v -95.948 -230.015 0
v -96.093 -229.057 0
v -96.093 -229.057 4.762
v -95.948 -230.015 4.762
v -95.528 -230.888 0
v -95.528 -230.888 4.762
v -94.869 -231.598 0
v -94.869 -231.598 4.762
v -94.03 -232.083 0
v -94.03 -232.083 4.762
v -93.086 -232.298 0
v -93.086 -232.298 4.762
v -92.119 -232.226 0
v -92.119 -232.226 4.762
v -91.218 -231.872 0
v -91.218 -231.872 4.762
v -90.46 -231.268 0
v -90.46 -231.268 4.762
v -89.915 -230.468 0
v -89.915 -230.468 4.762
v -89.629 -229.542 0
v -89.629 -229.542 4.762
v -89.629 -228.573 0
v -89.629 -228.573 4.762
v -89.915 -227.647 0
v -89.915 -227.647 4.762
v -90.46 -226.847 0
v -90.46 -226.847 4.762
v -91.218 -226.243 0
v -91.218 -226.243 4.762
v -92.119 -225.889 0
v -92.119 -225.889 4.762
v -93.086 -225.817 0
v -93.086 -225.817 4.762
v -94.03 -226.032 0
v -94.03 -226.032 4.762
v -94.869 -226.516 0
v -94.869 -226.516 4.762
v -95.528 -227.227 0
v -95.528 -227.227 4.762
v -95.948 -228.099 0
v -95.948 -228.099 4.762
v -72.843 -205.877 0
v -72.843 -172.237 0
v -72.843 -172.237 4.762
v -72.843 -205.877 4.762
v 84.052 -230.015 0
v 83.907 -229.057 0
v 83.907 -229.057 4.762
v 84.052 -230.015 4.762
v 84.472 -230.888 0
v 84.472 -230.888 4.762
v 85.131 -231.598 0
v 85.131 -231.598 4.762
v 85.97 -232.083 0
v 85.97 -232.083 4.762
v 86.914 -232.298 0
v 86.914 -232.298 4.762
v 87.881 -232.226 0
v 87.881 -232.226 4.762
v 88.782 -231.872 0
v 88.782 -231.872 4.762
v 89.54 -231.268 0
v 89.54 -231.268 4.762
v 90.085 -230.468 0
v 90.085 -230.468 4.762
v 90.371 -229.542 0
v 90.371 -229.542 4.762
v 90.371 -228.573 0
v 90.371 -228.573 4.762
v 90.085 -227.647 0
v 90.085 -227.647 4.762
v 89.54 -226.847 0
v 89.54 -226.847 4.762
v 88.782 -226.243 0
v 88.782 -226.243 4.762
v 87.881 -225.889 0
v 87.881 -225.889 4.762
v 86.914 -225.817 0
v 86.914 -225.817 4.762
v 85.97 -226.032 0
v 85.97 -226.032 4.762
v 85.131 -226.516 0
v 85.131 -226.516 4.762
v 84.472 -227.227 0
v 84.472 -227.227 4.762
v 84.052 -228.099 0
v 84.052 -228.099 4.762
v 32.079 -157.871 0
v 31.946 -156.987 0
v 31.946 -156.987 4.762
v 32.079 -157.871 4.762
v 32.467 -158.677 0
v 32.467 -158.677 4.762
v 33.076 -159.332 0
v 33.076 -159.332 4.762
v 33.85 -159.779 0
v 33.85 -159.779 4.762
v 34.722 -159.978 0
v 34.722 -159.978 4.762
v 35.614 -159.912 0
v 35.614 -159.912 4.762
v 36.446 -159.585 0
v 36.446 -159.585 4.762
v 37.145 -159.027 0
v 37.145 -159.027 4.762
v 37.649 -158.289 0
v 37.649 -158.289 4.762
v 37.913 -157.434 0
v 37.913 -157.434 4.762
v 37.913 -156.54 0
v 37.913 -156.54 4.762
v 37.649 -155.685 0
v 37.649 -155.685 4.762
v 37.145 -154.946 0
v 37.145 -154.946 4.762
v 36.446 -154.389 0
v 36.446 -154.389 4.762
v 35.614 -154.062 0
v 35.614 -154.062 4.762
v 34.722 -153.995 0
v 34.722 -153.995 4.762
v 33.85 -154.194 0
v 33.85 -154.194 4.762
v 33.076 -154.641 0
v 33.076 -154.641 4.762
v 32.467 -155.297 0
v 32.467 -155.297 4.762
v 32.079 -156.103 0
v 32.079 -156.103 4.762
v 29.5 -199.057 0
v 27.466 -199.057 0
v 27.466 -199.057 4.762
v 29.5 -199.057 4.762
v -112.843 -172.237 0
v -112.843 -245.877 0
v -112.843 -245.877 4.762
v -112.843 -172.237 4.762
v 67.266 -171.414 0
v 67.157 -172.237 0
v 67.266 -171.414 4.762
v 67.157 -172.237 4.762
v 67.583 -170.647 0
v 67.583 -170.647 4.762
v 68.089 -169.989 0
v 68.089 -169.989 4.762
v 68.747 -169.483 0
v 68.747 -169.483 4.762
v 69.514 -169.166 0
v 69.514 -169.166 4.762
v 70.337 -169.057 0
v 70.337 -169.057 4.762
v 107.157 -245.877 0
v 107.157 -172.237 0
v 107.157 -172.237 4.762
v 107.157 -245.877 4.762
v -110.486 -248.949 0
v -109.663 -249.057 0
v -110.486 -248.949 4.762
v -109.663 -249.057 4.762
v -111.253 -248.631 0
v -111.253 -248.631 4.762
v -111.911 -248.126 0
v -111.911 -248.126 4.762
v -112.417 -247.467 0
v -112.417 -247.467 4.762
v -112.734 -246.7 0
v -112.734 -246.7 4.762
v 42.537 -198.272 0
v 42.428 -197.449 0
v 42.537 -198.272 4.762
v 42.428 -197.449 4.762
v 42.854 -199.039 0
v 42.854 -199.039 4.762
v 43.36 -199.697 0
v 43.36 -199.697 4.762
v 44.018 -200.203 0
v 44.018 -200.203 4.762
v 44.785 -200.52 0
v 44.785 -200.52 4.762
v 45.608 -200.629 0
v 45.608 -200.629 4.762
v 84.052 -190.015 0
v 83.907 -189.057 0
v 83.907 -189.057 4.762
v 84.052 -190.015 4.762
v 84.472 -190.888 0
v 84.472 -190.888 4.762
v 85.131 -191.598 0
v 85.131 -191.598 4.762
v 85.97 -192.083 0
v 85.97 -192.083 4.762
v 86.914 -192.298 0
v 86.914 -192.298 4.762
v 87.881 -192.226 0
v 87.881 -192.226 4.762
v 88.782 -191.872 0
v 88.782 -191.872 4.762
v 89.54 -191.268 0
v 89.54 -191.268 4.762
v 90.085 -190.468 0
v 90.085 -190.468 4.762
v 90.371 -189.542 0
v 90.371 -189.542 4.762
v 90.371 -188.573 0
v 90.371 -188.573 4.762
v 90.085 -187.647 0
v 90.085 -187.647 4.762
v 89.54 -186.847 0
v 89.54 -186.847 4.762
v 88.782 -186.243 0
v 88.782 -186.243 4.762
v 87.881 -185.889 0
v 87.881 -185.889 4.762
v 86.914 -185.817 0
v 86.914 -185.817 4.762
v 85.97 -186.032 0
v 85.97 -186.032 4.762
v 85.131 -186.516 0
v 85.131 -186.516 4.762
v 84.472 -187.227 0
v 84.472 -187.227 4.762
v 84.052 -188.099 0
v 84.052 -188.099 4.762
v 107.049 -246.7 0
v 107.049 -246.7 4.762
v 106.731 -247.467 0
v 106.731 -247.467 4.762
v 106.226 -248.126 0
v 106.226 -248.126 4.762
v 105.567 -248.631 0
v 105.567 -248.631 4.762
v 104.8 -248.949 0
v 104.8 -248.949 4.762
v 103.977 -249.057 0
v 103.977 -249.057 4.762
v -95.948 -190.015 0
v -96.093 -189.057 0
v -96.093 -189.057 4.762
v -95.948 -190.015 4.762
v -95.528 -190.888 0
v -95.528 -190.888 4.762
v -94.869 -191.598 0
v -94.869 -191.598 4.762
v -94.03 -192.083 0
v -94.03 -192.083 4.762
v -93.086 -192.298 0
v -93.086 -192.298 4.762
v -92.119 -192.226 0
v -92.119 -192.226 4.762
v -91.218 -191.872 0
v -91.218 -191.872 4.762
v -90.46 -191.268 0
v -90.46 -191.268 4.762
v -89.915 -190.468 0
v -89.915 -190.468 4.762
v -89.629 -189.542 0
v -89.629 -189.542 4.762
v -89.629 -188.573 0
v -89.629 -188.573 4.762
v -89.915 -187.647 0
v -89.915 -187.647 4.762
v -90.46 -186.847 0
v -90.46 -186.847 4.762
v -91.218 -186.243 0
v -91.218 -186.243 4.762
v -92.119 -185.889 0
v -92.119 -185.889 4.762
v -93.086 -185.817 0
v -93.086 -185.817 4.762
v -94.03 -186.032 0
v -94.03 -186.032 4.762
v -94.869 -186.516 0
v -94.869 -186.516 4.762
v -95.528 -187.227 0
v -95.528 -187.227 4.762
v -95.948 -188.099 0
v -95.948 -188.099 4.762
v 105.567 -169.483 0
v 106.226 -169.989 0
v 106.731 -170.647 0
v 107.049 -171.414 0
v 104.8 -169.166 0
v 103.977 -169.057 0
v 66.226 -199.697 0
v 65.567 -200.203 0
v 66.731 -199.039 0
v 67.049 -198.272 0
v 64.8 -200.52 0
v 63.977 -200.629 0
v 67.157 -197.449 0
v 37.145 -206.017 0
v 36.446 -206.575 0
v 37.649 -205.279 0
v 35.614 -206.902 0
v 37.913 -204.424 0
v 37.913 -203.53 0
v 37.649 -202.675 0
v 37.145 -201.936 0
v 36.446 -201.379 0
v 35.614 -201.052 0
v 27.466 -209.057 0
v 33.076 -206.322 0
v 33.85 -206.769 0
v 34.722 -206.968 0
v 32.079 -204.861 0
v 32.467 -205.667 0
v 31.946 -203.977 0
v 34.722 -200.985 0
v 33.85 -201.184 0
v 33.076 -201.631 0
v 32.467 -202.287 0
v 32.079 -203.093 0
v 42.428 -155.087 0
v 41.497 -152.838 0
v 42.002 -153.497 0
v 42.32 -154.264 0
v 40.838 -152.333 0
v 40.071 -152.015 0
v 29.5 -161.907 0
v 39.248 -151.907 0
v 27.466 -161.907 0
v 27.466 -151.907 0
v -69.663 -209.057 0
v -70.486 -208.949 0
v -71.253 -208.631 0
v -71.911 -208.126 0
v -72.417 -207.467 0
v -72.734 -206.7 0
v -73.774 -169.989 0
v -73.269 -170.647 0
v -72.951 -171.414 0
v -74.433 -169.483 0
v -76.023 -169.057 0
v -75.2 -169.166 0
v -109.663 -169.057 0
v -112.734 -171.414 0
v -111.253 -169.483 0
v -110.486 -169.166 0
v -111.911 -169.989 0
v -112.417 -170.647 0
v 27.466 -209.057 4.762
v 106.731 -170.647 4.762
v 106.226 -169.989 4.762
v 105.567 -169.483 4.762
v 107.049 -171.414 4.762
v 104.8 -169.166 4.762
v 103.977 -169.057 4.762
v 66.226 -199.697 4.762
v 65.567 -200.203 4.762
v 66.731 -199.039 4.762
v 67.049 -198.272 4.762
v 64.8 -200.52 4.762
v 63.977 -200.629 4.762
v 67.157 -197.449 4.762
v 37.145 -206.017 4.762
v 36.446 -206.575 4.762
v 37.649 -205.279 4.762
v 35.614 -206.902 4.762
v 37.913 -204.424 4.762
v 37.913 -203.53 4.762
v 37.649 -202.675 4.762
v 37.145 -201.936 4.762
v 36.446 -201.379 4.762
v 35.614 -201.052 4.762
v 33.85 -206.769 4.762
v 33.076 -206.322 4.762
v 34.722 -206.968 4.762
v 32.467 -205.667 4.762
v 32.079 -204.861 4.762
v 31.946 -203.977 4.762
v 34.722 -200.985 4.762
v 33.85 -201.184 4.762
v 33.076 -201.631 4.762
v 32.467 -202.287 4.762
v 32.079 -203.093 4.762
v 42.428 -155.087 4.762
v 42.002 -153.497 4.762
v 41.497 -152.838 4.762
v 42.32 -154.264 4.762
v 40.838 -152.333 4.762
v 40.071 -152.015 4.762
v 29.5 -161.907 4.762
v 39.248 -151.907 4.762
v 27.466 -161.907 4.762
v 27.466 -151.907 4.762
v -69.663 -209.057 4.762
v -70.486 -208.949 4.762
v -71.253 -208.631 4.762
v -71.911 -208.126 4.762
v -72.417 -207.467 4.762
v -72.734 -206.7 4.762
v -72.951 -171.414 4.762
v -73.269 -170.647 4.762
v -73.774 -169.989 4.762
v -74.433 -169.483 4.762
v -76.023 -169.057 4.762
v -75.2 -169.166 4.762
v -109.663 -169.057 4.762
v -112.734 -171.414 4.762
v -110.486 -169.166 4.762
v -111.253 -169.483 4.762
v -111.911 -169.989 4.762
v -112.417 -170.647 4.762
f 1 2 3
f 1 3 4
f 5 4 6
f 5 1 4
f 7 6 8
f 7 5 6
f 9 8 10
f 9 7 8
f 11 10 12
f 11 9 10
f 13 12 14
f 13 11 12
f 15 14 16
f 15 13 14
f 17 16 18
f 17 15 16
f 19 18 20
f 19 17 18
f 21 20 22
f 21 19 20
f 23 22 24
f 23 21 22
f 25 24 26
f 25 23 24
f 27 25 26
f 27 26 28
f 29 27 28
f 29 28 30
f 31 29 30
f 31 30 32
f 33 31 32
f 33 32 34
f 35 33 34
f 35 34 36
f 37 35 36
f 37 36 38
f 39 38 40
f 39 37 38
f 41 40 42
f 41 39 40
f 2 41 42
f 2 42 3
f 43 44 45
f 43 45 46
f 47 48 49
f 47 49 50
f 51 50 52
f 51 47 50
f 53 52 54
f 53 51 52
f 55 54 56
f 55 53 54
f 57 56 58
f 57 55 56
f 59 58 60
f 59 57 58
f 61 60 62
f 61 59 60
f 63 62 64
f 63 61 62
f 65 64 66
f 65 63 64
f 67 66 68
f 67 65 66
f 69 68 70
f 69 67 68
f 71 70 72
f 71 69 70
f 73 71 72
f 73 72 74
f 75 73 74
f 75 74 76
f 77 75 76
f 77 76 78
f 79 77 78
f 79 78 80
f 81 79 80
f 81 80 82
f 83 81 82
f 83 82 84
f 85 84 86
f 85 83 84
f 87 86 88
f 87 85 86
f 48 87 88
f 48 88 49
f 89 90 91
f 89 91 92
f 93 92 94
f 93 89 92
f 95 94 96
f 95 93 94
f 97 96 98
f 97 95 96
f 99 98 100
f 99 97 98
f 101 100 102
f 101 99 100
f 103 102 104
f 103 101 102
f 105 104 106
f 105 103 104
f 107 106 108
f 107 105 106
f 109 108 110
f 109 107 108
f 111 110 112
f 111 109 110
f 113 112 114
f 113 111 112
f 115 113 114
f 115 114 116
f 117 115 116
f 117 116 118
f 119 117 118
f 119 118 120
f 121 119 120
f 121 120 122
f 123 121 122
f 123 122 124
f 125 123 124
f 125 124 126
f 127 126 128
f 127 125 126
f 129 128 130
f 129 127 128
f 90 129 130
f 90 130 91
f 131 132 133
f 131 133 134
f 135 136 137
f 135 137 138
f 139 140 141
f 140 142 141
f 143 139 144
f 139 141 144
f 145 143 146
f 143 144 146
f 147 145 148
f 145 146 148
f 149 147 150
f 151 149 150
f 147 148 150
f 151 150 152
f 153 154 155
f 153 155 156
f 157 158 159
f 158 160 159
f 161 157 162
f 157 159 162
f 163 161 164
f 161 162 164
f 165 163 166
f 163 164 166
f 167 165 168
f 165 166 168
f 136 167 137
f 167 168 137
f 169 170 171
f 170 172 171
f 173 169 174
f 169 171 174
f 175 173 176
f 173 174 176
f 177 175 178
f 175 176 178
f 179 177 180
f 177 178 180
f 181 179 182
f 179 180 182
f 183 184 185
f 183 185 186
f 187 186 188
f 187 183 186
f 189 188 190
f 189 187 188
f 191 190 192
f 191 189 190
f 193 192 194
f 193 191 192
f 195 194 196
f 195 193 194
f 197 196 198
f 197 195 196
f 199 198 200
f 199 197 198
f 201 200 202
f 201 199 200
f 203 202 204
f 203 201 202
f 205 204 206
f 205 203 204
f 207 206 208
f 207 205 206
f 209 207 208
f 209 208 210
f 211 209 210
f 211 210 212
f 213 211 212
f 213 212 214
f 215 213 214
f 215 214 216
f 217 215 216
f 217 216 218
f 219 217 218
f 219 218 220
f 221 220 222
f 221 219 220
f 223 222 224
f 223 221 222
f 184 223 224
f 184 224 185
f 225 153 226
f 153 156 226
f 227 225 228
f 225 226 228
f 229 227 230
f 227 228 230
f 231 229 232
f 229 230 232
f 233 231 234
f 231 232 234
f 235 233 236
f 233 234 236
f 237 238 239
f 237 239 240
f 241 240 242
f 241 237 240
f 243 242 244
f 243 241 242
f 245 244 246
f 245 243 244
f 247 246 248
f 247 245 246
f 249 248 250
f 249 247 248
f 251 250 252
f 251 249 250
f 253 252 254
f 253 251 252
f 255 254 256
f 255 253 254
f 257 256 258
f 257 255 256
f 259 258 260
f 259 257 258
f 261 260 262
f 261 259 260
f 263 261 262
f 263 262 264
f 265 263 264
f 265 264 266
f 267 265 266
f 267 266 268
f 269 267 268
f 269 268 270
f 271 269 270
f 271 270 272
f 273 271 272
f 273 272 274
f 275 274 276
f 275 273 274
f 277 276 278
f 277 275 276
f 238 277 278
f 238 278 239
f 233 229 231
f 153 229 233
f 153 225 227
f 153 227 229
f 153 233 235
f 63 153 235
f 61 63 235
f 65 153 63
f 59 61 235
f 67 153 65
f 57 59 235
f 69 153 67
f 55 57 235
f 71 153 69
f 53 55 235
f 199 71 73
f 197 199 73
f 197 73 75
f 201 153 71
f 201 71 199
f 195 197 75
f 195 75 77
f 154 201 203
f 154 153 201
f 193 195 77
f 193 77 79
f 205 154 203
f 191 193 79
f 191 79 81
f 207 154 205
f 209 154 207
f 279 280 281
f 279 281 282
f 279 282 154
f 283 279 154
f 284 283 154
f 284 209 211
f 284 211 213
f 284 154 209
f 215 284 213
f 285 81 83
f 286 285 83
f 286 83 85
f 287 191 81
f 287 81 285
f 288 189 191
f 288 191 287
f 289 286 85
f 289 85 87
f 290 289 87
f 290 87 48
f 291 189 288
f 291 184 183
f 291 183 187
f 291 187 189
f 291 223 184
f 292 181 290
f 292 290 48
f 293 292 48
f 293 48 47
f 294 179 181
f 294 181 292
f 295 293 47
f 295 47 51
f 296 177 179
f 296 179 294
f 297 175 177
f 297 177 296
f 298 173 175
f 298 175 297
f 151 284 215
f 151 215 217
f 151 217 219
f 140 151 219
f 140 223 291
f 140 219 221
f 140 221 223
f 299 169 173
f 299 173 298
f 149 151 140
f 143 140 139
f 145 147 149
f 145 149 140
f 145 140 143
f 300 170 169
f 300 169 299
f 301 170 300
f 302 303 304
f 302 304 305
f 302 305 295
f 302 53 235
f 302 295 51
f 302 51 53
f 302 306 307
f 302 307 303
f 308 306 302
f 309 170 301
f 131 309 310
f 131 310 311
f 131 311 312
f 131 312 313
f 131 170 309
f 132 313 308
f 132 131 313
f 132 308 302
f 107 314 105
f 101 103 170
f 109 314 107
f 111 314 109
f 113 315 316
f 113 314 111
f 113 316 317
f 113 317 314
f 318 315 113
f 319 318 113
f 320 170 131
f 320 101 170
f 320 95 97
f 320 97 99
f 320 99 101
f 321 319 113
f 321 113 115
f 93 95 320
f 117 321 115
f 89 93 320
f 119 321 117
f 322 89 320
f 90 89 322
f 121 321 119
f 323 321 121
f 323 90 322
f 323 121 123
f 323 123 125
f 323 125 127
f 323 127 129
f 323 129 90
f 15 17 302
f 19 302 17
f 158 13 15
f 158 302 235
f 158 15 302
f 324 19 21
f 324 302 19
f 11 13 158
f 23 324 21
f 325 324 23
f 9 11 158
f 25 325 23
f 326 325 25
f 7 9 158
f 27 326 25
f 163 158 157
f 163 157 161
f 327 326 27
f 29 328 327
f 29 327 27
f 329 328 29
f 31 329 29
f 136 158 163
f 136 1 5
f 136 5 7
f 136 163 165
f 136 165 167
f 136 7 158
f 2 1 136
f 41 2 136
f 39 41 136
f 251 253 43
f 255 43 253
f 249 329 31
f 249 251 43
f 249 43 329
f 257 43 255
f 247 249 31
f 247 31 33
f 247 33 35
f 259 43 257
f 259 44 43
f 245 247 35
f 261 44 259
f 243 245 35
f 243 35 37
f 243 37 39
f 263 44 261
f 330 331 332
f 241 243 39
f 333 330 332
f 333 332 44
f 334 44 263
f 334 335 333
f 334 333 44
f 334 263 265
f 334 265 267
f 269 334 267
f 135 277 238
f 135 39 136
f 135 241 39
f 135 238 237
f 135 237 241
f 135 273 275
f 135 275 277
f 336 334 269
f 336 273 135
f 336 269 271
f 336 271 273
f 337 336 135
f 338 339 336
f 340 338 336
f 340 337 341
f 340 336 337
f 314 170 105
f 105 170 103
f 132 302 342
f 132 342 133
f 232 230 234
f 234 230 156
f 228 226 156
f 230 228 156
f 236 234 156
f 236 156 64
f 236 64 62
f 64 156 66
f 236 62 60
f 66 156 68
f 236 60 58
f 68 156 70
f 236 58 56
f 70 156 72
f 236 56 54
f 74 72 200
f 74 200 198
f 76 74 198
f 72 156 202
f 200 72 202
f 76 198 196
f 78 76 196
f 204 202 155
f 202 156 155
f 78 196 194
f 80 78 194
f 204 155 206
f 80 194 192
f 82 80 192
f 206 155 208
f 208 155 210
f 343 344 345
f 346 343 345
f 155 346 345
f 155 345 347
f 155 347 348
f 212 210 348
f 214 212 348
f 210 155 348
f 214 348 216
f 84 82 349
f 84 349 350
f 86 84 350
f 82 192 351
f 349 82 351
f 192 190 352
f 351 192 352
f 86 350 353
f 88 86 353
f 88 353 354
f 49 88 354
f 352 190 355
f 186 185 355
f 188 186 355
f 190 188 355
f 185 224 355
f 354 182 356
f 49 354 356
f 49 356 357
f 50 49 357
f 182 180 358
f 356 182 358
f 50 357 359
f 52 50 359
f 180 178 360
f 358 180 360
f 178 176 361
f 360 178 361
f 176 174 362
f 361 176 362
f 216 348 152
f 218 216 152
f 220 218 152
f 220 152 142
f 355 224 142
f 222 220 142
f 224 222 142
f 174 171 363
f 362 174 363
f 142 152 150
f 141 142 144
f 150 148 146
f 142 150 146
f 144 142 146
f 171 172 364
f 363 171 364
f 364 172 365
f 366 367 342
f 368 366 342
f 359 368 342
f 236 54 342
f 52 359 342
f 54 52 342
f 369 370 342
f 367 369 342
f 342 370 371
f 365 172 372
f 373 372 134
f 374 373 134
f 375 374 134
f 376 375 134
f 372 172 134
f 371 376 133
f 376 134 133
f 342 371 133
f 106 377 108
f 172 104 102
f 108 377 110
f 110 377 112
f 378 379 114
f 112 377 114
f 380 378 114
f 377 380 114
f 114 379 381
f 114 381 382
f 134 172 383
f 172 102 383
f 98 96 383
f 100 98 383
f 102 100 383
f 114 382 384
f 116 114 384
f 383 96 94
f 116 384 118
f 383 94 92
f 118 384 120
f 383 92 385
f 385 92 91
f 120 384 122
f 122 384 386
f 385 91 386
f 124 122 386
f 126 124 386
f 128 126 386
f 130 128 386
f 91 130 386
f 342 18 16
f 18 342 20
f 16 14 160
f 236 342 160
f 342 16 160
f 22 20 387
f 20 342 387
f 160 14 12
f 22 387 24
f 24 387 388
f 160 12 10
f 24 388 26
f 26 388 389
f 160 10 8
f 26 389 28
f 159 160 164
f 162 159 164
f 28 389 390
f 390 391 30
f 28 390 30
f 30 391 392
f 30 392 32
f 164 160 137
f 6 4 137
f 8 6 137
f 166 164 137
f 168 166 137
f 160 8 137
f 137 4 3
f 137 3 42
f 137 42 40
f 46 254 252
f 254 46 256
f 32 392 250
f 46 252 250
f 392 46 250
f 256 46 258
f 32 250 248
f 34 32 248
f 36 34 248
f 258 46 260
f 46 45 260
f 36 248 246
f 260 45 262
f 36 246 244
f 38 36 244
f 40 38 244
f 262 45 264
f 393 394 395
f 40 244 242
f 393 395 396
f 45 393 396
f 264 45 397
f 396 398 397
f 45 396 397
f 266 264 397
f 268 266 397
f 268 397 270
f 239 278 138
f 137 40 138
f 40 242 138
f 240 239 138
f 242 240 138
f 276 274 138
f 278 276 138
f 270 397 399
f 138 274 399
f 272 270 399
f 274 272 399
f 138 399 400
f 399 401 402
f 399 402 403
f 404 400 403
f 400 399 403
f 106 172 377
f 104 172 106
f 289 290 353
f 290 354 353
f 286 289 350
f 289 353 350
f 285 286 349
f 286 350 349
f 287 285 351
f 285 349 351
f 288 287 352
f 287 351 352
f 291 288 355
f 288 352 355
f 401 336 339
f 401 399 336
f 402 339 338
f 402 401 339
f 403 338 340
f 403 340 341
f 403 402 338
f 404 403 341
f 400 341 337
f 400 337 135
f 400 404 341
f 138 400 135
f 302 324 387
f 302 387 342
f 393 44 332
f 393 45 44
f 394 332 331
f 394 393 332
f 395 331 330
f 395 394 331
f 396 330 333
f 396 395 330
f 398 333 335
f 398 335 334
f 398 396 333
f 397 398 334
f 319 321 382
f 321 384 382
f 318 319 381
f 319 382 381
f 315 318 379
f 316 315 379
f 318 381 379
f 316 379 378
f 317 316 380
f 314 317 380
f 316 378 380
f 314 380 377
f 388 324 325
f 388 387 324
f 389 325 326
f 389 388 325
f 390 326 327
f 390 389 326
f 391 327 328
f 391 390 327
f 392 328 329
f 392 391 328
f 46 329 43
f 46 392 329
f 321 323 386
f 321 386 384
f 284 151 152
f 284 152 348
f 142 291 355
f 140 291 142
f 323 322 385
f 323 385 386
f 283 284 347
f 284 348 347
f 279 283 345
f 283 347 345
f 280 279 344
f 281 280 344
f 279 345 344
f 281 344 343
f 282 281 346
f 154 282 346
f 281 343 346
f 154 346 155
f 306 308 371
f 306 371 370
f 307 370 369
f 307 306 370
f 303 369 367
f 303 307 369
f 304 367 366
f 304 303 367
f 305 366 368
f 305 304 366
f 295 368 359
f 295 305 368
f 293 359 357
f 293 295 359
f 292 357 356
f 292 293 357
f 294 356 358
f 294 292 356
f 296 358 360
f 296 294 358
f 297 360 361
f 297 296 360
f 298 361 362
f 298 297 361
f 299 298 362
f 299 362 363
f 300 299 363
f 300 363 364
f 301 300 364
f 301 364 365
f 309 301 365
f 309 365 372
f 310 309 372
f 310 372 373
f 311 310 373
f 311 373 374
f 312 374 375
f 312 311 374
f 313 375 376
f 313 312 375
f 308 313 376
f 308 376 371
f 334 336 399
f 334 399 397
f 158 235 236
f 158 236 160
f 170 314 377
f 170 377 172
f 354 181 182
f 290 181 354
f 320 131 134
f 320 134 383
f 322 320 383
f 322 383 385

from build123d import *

# Parameters (mm, degrees)
SKETCH1_R           = 3.25
SKETCH1_R_2         = 3
BOSS_EXTRUDE1_DEPTH = 4.7625
FILLET3_R           = 3.18


with BuildPart() as part:
    # Sketch1 → Boss-Extrude1 (new body)
    with BuildSketch(Plane.XY):
        Polygon((27.466141976, -161.906947321), (27.466141976, -151.906947321), (42.428200405, -151.906947321), (42.428200405, -200.628730702), (67.157321136, -200.628730702), (67.157321136, -169.057449544), (107.157321136, -169.057449544), (107.157321136, -249.057449544), (-112.842678864, -249.057449544), (-112.842678864, -169.057449544), (-72.842678864, -169.057449544), (-72.842678864, -209.057449544), (27.466141976, -209.057449544), (27.466141976, -199.057449544), (29.50037366, -199.057449544), (29.50037366, -161.906947321), align=None)
        with Locations(Location((-92.842678864, -189.057449544, 0), (0, 0, 180))):
            Circle(SKETCH1_R, mode=Mode.SUBTRACT)
        with Locations(Location((87.157321136, -189.057449544, 0), (0, 0, 180))):
            Circle(SKETCH1_R, mode=Mode.SUBTRACT)
        with Locations(Location((87.157321136, -229.057449544, 0), (0, 0, 180))):
            Circle(SKETCH1_R, mode=Mode.SUBTRACT)
        with Locations(Location((-92.842678864, -229.057449544, 0), (0, 0, 180))):
            Circle(SKETCH1_R, mode=Mode.SUBTRACT)
        with Locations(Location((34.946141976, -203.976877703, 0), (0, 0, 180))):
            Circle(SKETCH1_R_2, mode=Mode.SUBTRACT)
        with Locations(Location((34.946141976, -156.986877707, 0), (0, 0, 180))):
            Circle(SKETCH1_R_2, mode=Mode.SUBTRACT)
    extrude(amount=BOSS_EXTRUDE1_DEPTH)

    # Fillet3
    fillet3_edges = [part.edges().sort_by_distance(p)[0] for p in [
        (-112.842678864, -169.057449544, 2.38125),
        (-72.842678864, -169.057449544, 2.38125),
        (-72.842678864, -209.057449544, 2.38125),
        (42.428200405, -151.906947321, 2.38125),
        (42.428200405, -200.628730702, 2.38125),
        (67.157321136, -200.628730702, 2.38125),
        (67.157321136, -169.057449544, 2.38125),
        (107.157321136, -169.057449544, 2.38125),
        (107.157321136, -249.057449544, 2.38125),
        (-112.842678864, -249.057449544, 2.38125),
    ]]
    fillet(fillet3_edges, radius=FILLET3_R)


solid = part.part
